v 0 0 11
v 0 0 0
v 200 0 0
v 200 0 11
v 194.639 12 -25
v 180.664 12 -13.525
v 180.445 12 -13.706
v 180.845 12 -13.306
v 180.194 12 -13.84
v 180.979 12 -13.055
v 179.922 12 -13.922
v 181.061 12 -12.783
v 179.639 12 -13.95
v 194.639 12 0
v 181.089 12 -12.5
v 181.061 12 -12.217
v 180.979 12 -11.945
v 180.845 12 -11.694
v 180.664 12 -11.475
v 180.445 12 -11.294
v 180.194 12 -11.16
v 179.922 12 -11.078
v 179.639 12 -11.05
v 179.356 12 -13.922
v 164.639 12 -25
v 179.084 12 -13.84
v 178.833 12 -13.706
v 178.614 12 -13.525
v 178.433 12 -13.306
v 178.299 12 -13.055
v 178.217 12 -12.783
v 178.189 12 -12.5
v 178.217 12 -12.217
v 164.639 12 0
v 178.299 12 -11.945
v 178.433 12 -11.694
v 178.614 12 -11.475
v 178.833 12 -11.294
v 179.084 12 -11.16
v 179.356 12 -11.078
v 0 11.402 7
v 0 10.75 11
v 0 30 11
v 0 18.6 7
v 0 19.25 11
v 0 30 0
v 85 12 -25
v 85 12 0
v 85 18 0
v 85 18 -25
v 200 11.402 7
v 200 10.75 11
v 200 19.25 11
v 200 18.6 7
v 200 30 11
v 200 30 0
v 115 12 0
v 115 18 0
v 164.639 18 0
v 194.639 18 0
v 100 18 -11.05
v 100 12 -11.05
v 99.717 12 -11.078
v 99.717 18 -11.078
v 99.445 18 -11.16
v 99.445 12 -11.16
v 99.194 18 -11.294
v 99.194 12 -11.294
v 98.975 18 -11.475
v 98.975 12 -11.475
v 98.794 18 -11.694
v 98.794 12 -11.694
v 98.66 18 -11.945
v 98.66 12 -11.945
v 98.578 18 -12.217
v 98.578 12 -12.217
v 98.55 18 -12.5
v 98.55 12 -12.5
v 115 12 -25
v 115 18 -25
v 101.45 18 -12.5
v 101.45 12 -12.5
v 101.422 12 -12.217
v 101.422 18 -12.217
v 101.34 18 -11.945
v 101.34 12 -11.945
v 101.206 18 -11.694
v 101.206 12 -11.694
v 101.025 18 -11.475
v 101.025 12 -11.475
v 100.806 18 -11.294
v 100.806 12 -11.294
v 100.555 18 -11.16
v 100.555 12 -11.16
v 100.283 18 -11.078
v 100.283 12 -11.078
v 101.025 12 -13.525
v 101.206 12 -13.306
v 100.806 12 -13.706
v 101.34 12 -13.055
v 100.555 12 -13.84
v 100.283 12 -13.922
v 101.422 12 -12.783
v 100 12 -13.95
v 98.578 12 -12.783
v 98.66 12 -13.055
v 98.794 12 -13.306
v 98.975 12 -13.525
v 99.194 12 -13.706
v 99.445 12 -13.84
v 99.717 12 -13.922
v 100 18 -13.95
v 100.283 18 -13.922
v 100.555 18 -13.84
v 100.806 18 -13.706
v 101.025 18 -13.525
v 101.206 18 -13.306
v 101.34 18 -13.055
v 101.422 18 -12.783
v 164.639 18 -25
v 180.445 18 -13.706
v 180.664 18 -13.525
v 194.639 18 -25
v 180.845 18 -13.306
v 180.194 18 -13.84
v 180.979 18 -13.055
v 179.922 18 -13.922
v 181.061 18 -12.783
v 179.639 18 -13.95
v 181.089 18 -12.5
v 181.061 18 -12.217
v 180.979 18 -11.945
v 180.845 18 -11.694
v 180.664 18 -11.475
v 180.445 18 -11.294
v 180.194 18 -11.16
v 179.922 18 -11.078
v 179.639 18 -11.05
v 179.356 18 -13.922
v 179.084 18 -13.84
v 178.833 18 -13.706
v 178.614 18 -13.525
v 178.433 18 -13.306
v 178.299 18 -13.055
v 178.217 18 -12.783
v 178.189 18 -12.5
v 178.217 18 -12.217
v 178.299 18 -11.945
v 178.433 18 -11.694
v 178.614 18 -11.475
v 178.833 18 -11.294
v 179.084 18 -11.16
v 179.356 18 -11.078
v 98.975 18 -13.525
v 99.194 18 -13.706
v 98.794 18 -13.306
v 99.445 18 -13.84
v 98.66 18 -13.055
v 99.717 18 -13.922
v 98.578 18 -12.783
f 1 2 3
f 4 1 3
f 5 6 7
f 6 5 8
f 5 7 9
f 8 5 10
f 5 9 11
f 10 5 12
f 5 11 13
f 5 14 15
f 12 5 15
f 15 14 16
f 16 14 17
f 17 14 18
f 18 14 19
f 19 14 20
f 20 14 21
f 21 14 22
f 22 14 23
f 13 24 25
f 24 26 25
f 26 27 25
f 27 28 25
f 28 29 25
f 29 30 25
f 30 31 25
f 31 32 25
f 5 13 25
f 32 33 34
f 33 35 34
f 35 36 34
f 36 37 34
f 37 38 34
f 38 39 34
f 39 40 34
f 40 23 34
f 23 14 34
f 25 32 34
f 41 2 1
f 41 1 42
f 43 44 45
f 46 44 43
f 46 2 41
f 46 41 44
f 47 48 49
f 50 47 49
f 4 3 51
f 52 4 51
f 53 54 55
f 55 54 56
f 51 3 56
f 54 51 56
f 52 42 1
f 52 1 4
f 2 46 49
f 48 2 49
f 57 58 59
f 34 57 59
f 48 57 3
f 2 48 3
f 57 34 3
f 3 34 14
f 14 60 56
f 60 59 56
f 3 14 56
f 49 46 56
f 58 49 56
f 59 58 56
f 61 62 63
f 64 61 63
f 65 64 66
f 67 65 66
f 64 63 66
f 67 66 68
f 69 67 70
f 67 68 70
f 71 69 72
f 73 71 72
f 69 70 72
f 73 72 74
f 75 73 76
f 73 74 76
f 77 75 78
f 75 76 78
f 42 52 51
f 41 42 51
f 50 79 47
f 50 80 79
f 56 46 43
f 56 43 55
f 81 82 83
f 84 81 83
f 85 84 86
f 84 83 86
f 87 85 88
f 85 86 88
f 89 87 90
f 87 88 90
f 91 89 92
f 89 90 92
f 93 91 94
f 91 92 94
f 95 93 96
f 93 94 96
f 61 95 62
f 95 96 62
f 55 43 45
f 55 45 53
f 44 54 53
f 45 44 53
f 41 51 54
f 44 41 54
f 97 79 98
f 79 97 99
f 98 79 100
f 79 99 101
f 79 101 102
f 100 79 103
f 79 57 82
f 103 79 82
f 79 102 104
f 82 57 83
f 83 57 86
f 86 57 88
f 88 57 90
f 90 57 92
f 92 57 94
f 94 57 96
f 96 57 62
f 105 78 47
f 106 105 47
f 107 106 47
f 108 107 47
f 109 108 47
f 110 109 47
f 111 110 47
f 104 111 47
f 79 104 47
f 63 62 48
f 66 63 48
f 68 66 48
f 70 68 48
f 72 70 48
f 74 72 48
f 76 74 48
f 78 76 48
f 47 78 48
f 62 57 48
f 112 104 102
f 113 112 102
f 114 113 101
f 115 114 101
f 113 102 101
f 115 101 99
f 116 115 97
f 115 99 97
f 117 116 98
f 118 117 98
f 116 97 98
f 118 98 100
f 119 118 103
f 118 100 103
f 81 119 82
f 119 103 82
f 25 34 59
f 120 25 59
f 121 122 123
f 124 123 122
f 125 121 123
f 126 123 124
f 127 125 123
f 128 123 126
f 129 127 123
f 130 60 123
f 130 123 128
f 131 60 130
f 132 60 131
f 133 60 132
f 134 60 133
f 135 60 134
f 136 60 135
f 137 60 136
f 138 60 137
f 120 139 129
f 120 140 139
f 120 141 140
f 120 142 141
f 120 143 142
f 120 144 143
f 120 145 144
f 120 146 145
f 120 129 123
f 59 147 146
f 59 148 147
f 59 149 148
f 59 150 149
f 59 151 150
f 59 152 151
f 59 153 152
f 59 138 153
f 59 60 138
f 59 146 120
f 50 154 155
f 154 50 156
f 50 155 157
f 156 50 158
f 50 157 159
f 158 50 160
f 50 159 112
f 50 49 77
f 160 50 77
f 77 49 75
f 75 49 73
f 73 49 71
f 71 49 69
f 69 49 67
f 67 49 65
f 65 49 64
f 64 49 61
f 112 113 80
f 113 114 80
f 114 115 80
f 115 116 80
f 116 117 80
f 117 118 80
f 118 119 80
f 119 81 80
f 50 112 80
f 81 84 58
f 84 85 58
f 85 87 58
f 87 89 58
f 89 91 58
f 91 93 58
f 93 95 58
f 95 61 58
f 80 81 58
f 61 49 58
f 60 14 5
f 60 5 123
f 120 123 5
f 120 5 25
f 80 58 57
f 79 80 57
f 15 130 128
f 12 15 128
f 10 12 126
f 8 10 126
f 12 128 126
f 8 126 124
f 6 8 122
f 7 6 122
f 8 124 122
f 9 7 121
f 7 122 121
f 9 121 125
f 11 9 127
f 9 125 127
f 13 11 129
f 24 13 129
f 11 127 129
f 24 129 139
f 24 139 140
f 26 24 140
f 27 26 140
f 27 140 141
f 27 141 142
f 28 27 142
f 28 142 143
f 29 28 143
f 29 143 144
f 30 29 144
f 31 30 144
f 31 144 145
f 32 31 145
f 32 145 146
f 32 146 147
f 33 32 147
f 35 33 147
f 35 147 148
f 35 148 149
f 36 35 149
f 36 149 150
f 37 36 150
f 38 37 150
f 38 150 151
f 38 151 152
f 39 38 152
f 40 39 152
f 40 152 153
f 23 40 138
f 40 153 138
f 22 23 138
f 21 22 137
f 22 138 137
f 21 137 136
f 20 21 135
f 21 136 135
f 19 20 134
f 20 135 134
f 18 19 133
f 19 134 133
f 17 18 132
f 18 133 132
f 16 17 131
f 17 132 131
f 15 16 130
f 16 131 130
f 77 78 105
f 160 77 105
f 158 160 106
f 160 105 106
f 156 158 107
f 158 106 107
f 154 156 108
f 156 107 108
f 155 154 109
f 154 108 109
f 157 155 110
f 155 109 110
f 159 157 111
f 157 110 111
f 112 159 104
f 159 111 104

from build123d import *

# Parameters (mm, degrees)
SKETCH_1_W          = 200
SKETCH_1_H          = 30
EXTRUDE_1_DEPTH     = 11
SKETCH_4_W          = 15
SKETCH_4_H          = 3
EXTRUDE_2_DEPTH     = 25
CUT_EXTRUDE_2_DEPTH = 204.776838723
CUT_EXTRUDE_3_DEPTH = 203.358592602
SKETCH_9_W          = 30
SKETCH_9_H          = 6
EXTRUDE_3_DEPTH     = 25
CUT_EXTRUDE_4_DEPTH = 203.358592602


with BuildPart() as part:
    # 草圖1 → 填料-伸長1 (new body)
    with BuildSketch(Plane.XY):
        with Locations((100, 15)):
            Rectangle(SKETCH_1_W, SKETCH_1_H)
    extrude(amount=EXTRUDE_1_DEPTH)

    # 草圖4 → 填料-伸長2 (add)
    with BuildSketch(Plane(origin=(0, 0, 0), x_dir=(-1, 0, 0), z_dir=(0, 0, -1))):
        with Locations((-107.5, 13.5)):
            Rectangle(SKETCH_4_W, SKETCH_4_H)
        with Locations((-107.5, 16.5)):
            Rectangle(SKETCH_4_W, SKETCH_4_H)
        with Locations((-92.5, 16.5)):
            Rectangle(SKETCH_4_W, SKETCH_4_H)
        with Locations((-92.5, 13.5)):
            Rectangle(SKETCH_4_W, SKETCH_4_H)
    extrude(amount=EXTRUDE_2_DEPTH)

    # 草圖5 → 除料-伸長2 (cut, through all)
    with BuildSketch(Plane(origin=(200, 0, 0), x_dir=(0, 0, -1), z_dir=(1, 0, 0))):
        Polygon((-11, 15), (-7, 15), (-7, 18.6), (-11, 19.25), align=None)
        Polygon((-7, 11.402039536), (-7, 15), (-11, 15), (-11, 10.75), align=None)
    extrude(amount=-CUT_EXTRUDE_2_DEPTH, mode=Mode.SUBTRACT)

    # 草圖6 → 除料-伸長3 (cut, through all)
    with BuildSketch(Plane.XZ.offset(-12)):
        with BuildLine():
            ThreePointArc((101.45, -12.5), (101.025304833, -11.474695167), (100, -11.05))
            Line((100, -11.05), (100, -12.5))
            Line((100, -12.5), (101.45, -12.5))
        make_face()
        with BuildLine():
            Line((100, -12.5), (100, -11.05))
            ThreePointArc((100, -11.05), (98.974695167, -11.474695167), (98.55, -12.5))
            Line((98.55, -12.5), (100, -12.5))
        make_face()
        with BuildLine():
            Line((101.45, -12.5), (100, -12.5))
            Line((100, -12.5), (100, -13.95))
            ThreePointArc((100, -13.95), (101.025304833, -13.525304833), (101.45, -12.5))
        make_face()
        with BuildLine():
            Line((100, -13.95), (100, -12.5))
            Line((100, -12.5), (98.55, -12.5))
            ThreePointArc((98.55, -12.5), (98.974695167, -13.525304833), (100, -13.95))
        make_face()
    extrude(amount=-CUT_EXTRUDE_3_DEPTH, mode=Mode.SUBTRACT)

    # 草圖9 → 填料-伸長3 (add)
    with BuildSketch(Plane(origin=(0, 0, 0), x_dir=(-1, 0, 0), z_dir=(0, 0, -1))):
        with Locations((-179.638936631, 15)):
            Rectangle(SKETCH_9_W, SKETCH_9_H)
    extrude(amount=EXTRUDE_3_DEPTH)

    # 草圖10 → 除料-伸長4 (cut, through all)
    with BuildSketch(Plane(origin=(0, 18, 0), x_dir=(1, 0, 0), z_dir=(0, 1, 0))):
        with BuildLine():
            ThreePointArc((178.188936631, 12.5), (179.638936631, 11.05), (181.088936631, 12.5))
            Line((181.088936631, 12.5), (178.188936631, 12.5))
        make_face()
        with BuildLine():
            Line((178.188936631, 12.5), (181.088936631, 12.5))
            ThreePointArc((181.088936631, 12.5), (179.638936631, 13.95), (178.188936631, 12.5))
        make_face()
    extrude(amount=-CUT_EXTRUDE_4_DEPTH, mode=Mode.SUBTRACT)


solid = part.part
